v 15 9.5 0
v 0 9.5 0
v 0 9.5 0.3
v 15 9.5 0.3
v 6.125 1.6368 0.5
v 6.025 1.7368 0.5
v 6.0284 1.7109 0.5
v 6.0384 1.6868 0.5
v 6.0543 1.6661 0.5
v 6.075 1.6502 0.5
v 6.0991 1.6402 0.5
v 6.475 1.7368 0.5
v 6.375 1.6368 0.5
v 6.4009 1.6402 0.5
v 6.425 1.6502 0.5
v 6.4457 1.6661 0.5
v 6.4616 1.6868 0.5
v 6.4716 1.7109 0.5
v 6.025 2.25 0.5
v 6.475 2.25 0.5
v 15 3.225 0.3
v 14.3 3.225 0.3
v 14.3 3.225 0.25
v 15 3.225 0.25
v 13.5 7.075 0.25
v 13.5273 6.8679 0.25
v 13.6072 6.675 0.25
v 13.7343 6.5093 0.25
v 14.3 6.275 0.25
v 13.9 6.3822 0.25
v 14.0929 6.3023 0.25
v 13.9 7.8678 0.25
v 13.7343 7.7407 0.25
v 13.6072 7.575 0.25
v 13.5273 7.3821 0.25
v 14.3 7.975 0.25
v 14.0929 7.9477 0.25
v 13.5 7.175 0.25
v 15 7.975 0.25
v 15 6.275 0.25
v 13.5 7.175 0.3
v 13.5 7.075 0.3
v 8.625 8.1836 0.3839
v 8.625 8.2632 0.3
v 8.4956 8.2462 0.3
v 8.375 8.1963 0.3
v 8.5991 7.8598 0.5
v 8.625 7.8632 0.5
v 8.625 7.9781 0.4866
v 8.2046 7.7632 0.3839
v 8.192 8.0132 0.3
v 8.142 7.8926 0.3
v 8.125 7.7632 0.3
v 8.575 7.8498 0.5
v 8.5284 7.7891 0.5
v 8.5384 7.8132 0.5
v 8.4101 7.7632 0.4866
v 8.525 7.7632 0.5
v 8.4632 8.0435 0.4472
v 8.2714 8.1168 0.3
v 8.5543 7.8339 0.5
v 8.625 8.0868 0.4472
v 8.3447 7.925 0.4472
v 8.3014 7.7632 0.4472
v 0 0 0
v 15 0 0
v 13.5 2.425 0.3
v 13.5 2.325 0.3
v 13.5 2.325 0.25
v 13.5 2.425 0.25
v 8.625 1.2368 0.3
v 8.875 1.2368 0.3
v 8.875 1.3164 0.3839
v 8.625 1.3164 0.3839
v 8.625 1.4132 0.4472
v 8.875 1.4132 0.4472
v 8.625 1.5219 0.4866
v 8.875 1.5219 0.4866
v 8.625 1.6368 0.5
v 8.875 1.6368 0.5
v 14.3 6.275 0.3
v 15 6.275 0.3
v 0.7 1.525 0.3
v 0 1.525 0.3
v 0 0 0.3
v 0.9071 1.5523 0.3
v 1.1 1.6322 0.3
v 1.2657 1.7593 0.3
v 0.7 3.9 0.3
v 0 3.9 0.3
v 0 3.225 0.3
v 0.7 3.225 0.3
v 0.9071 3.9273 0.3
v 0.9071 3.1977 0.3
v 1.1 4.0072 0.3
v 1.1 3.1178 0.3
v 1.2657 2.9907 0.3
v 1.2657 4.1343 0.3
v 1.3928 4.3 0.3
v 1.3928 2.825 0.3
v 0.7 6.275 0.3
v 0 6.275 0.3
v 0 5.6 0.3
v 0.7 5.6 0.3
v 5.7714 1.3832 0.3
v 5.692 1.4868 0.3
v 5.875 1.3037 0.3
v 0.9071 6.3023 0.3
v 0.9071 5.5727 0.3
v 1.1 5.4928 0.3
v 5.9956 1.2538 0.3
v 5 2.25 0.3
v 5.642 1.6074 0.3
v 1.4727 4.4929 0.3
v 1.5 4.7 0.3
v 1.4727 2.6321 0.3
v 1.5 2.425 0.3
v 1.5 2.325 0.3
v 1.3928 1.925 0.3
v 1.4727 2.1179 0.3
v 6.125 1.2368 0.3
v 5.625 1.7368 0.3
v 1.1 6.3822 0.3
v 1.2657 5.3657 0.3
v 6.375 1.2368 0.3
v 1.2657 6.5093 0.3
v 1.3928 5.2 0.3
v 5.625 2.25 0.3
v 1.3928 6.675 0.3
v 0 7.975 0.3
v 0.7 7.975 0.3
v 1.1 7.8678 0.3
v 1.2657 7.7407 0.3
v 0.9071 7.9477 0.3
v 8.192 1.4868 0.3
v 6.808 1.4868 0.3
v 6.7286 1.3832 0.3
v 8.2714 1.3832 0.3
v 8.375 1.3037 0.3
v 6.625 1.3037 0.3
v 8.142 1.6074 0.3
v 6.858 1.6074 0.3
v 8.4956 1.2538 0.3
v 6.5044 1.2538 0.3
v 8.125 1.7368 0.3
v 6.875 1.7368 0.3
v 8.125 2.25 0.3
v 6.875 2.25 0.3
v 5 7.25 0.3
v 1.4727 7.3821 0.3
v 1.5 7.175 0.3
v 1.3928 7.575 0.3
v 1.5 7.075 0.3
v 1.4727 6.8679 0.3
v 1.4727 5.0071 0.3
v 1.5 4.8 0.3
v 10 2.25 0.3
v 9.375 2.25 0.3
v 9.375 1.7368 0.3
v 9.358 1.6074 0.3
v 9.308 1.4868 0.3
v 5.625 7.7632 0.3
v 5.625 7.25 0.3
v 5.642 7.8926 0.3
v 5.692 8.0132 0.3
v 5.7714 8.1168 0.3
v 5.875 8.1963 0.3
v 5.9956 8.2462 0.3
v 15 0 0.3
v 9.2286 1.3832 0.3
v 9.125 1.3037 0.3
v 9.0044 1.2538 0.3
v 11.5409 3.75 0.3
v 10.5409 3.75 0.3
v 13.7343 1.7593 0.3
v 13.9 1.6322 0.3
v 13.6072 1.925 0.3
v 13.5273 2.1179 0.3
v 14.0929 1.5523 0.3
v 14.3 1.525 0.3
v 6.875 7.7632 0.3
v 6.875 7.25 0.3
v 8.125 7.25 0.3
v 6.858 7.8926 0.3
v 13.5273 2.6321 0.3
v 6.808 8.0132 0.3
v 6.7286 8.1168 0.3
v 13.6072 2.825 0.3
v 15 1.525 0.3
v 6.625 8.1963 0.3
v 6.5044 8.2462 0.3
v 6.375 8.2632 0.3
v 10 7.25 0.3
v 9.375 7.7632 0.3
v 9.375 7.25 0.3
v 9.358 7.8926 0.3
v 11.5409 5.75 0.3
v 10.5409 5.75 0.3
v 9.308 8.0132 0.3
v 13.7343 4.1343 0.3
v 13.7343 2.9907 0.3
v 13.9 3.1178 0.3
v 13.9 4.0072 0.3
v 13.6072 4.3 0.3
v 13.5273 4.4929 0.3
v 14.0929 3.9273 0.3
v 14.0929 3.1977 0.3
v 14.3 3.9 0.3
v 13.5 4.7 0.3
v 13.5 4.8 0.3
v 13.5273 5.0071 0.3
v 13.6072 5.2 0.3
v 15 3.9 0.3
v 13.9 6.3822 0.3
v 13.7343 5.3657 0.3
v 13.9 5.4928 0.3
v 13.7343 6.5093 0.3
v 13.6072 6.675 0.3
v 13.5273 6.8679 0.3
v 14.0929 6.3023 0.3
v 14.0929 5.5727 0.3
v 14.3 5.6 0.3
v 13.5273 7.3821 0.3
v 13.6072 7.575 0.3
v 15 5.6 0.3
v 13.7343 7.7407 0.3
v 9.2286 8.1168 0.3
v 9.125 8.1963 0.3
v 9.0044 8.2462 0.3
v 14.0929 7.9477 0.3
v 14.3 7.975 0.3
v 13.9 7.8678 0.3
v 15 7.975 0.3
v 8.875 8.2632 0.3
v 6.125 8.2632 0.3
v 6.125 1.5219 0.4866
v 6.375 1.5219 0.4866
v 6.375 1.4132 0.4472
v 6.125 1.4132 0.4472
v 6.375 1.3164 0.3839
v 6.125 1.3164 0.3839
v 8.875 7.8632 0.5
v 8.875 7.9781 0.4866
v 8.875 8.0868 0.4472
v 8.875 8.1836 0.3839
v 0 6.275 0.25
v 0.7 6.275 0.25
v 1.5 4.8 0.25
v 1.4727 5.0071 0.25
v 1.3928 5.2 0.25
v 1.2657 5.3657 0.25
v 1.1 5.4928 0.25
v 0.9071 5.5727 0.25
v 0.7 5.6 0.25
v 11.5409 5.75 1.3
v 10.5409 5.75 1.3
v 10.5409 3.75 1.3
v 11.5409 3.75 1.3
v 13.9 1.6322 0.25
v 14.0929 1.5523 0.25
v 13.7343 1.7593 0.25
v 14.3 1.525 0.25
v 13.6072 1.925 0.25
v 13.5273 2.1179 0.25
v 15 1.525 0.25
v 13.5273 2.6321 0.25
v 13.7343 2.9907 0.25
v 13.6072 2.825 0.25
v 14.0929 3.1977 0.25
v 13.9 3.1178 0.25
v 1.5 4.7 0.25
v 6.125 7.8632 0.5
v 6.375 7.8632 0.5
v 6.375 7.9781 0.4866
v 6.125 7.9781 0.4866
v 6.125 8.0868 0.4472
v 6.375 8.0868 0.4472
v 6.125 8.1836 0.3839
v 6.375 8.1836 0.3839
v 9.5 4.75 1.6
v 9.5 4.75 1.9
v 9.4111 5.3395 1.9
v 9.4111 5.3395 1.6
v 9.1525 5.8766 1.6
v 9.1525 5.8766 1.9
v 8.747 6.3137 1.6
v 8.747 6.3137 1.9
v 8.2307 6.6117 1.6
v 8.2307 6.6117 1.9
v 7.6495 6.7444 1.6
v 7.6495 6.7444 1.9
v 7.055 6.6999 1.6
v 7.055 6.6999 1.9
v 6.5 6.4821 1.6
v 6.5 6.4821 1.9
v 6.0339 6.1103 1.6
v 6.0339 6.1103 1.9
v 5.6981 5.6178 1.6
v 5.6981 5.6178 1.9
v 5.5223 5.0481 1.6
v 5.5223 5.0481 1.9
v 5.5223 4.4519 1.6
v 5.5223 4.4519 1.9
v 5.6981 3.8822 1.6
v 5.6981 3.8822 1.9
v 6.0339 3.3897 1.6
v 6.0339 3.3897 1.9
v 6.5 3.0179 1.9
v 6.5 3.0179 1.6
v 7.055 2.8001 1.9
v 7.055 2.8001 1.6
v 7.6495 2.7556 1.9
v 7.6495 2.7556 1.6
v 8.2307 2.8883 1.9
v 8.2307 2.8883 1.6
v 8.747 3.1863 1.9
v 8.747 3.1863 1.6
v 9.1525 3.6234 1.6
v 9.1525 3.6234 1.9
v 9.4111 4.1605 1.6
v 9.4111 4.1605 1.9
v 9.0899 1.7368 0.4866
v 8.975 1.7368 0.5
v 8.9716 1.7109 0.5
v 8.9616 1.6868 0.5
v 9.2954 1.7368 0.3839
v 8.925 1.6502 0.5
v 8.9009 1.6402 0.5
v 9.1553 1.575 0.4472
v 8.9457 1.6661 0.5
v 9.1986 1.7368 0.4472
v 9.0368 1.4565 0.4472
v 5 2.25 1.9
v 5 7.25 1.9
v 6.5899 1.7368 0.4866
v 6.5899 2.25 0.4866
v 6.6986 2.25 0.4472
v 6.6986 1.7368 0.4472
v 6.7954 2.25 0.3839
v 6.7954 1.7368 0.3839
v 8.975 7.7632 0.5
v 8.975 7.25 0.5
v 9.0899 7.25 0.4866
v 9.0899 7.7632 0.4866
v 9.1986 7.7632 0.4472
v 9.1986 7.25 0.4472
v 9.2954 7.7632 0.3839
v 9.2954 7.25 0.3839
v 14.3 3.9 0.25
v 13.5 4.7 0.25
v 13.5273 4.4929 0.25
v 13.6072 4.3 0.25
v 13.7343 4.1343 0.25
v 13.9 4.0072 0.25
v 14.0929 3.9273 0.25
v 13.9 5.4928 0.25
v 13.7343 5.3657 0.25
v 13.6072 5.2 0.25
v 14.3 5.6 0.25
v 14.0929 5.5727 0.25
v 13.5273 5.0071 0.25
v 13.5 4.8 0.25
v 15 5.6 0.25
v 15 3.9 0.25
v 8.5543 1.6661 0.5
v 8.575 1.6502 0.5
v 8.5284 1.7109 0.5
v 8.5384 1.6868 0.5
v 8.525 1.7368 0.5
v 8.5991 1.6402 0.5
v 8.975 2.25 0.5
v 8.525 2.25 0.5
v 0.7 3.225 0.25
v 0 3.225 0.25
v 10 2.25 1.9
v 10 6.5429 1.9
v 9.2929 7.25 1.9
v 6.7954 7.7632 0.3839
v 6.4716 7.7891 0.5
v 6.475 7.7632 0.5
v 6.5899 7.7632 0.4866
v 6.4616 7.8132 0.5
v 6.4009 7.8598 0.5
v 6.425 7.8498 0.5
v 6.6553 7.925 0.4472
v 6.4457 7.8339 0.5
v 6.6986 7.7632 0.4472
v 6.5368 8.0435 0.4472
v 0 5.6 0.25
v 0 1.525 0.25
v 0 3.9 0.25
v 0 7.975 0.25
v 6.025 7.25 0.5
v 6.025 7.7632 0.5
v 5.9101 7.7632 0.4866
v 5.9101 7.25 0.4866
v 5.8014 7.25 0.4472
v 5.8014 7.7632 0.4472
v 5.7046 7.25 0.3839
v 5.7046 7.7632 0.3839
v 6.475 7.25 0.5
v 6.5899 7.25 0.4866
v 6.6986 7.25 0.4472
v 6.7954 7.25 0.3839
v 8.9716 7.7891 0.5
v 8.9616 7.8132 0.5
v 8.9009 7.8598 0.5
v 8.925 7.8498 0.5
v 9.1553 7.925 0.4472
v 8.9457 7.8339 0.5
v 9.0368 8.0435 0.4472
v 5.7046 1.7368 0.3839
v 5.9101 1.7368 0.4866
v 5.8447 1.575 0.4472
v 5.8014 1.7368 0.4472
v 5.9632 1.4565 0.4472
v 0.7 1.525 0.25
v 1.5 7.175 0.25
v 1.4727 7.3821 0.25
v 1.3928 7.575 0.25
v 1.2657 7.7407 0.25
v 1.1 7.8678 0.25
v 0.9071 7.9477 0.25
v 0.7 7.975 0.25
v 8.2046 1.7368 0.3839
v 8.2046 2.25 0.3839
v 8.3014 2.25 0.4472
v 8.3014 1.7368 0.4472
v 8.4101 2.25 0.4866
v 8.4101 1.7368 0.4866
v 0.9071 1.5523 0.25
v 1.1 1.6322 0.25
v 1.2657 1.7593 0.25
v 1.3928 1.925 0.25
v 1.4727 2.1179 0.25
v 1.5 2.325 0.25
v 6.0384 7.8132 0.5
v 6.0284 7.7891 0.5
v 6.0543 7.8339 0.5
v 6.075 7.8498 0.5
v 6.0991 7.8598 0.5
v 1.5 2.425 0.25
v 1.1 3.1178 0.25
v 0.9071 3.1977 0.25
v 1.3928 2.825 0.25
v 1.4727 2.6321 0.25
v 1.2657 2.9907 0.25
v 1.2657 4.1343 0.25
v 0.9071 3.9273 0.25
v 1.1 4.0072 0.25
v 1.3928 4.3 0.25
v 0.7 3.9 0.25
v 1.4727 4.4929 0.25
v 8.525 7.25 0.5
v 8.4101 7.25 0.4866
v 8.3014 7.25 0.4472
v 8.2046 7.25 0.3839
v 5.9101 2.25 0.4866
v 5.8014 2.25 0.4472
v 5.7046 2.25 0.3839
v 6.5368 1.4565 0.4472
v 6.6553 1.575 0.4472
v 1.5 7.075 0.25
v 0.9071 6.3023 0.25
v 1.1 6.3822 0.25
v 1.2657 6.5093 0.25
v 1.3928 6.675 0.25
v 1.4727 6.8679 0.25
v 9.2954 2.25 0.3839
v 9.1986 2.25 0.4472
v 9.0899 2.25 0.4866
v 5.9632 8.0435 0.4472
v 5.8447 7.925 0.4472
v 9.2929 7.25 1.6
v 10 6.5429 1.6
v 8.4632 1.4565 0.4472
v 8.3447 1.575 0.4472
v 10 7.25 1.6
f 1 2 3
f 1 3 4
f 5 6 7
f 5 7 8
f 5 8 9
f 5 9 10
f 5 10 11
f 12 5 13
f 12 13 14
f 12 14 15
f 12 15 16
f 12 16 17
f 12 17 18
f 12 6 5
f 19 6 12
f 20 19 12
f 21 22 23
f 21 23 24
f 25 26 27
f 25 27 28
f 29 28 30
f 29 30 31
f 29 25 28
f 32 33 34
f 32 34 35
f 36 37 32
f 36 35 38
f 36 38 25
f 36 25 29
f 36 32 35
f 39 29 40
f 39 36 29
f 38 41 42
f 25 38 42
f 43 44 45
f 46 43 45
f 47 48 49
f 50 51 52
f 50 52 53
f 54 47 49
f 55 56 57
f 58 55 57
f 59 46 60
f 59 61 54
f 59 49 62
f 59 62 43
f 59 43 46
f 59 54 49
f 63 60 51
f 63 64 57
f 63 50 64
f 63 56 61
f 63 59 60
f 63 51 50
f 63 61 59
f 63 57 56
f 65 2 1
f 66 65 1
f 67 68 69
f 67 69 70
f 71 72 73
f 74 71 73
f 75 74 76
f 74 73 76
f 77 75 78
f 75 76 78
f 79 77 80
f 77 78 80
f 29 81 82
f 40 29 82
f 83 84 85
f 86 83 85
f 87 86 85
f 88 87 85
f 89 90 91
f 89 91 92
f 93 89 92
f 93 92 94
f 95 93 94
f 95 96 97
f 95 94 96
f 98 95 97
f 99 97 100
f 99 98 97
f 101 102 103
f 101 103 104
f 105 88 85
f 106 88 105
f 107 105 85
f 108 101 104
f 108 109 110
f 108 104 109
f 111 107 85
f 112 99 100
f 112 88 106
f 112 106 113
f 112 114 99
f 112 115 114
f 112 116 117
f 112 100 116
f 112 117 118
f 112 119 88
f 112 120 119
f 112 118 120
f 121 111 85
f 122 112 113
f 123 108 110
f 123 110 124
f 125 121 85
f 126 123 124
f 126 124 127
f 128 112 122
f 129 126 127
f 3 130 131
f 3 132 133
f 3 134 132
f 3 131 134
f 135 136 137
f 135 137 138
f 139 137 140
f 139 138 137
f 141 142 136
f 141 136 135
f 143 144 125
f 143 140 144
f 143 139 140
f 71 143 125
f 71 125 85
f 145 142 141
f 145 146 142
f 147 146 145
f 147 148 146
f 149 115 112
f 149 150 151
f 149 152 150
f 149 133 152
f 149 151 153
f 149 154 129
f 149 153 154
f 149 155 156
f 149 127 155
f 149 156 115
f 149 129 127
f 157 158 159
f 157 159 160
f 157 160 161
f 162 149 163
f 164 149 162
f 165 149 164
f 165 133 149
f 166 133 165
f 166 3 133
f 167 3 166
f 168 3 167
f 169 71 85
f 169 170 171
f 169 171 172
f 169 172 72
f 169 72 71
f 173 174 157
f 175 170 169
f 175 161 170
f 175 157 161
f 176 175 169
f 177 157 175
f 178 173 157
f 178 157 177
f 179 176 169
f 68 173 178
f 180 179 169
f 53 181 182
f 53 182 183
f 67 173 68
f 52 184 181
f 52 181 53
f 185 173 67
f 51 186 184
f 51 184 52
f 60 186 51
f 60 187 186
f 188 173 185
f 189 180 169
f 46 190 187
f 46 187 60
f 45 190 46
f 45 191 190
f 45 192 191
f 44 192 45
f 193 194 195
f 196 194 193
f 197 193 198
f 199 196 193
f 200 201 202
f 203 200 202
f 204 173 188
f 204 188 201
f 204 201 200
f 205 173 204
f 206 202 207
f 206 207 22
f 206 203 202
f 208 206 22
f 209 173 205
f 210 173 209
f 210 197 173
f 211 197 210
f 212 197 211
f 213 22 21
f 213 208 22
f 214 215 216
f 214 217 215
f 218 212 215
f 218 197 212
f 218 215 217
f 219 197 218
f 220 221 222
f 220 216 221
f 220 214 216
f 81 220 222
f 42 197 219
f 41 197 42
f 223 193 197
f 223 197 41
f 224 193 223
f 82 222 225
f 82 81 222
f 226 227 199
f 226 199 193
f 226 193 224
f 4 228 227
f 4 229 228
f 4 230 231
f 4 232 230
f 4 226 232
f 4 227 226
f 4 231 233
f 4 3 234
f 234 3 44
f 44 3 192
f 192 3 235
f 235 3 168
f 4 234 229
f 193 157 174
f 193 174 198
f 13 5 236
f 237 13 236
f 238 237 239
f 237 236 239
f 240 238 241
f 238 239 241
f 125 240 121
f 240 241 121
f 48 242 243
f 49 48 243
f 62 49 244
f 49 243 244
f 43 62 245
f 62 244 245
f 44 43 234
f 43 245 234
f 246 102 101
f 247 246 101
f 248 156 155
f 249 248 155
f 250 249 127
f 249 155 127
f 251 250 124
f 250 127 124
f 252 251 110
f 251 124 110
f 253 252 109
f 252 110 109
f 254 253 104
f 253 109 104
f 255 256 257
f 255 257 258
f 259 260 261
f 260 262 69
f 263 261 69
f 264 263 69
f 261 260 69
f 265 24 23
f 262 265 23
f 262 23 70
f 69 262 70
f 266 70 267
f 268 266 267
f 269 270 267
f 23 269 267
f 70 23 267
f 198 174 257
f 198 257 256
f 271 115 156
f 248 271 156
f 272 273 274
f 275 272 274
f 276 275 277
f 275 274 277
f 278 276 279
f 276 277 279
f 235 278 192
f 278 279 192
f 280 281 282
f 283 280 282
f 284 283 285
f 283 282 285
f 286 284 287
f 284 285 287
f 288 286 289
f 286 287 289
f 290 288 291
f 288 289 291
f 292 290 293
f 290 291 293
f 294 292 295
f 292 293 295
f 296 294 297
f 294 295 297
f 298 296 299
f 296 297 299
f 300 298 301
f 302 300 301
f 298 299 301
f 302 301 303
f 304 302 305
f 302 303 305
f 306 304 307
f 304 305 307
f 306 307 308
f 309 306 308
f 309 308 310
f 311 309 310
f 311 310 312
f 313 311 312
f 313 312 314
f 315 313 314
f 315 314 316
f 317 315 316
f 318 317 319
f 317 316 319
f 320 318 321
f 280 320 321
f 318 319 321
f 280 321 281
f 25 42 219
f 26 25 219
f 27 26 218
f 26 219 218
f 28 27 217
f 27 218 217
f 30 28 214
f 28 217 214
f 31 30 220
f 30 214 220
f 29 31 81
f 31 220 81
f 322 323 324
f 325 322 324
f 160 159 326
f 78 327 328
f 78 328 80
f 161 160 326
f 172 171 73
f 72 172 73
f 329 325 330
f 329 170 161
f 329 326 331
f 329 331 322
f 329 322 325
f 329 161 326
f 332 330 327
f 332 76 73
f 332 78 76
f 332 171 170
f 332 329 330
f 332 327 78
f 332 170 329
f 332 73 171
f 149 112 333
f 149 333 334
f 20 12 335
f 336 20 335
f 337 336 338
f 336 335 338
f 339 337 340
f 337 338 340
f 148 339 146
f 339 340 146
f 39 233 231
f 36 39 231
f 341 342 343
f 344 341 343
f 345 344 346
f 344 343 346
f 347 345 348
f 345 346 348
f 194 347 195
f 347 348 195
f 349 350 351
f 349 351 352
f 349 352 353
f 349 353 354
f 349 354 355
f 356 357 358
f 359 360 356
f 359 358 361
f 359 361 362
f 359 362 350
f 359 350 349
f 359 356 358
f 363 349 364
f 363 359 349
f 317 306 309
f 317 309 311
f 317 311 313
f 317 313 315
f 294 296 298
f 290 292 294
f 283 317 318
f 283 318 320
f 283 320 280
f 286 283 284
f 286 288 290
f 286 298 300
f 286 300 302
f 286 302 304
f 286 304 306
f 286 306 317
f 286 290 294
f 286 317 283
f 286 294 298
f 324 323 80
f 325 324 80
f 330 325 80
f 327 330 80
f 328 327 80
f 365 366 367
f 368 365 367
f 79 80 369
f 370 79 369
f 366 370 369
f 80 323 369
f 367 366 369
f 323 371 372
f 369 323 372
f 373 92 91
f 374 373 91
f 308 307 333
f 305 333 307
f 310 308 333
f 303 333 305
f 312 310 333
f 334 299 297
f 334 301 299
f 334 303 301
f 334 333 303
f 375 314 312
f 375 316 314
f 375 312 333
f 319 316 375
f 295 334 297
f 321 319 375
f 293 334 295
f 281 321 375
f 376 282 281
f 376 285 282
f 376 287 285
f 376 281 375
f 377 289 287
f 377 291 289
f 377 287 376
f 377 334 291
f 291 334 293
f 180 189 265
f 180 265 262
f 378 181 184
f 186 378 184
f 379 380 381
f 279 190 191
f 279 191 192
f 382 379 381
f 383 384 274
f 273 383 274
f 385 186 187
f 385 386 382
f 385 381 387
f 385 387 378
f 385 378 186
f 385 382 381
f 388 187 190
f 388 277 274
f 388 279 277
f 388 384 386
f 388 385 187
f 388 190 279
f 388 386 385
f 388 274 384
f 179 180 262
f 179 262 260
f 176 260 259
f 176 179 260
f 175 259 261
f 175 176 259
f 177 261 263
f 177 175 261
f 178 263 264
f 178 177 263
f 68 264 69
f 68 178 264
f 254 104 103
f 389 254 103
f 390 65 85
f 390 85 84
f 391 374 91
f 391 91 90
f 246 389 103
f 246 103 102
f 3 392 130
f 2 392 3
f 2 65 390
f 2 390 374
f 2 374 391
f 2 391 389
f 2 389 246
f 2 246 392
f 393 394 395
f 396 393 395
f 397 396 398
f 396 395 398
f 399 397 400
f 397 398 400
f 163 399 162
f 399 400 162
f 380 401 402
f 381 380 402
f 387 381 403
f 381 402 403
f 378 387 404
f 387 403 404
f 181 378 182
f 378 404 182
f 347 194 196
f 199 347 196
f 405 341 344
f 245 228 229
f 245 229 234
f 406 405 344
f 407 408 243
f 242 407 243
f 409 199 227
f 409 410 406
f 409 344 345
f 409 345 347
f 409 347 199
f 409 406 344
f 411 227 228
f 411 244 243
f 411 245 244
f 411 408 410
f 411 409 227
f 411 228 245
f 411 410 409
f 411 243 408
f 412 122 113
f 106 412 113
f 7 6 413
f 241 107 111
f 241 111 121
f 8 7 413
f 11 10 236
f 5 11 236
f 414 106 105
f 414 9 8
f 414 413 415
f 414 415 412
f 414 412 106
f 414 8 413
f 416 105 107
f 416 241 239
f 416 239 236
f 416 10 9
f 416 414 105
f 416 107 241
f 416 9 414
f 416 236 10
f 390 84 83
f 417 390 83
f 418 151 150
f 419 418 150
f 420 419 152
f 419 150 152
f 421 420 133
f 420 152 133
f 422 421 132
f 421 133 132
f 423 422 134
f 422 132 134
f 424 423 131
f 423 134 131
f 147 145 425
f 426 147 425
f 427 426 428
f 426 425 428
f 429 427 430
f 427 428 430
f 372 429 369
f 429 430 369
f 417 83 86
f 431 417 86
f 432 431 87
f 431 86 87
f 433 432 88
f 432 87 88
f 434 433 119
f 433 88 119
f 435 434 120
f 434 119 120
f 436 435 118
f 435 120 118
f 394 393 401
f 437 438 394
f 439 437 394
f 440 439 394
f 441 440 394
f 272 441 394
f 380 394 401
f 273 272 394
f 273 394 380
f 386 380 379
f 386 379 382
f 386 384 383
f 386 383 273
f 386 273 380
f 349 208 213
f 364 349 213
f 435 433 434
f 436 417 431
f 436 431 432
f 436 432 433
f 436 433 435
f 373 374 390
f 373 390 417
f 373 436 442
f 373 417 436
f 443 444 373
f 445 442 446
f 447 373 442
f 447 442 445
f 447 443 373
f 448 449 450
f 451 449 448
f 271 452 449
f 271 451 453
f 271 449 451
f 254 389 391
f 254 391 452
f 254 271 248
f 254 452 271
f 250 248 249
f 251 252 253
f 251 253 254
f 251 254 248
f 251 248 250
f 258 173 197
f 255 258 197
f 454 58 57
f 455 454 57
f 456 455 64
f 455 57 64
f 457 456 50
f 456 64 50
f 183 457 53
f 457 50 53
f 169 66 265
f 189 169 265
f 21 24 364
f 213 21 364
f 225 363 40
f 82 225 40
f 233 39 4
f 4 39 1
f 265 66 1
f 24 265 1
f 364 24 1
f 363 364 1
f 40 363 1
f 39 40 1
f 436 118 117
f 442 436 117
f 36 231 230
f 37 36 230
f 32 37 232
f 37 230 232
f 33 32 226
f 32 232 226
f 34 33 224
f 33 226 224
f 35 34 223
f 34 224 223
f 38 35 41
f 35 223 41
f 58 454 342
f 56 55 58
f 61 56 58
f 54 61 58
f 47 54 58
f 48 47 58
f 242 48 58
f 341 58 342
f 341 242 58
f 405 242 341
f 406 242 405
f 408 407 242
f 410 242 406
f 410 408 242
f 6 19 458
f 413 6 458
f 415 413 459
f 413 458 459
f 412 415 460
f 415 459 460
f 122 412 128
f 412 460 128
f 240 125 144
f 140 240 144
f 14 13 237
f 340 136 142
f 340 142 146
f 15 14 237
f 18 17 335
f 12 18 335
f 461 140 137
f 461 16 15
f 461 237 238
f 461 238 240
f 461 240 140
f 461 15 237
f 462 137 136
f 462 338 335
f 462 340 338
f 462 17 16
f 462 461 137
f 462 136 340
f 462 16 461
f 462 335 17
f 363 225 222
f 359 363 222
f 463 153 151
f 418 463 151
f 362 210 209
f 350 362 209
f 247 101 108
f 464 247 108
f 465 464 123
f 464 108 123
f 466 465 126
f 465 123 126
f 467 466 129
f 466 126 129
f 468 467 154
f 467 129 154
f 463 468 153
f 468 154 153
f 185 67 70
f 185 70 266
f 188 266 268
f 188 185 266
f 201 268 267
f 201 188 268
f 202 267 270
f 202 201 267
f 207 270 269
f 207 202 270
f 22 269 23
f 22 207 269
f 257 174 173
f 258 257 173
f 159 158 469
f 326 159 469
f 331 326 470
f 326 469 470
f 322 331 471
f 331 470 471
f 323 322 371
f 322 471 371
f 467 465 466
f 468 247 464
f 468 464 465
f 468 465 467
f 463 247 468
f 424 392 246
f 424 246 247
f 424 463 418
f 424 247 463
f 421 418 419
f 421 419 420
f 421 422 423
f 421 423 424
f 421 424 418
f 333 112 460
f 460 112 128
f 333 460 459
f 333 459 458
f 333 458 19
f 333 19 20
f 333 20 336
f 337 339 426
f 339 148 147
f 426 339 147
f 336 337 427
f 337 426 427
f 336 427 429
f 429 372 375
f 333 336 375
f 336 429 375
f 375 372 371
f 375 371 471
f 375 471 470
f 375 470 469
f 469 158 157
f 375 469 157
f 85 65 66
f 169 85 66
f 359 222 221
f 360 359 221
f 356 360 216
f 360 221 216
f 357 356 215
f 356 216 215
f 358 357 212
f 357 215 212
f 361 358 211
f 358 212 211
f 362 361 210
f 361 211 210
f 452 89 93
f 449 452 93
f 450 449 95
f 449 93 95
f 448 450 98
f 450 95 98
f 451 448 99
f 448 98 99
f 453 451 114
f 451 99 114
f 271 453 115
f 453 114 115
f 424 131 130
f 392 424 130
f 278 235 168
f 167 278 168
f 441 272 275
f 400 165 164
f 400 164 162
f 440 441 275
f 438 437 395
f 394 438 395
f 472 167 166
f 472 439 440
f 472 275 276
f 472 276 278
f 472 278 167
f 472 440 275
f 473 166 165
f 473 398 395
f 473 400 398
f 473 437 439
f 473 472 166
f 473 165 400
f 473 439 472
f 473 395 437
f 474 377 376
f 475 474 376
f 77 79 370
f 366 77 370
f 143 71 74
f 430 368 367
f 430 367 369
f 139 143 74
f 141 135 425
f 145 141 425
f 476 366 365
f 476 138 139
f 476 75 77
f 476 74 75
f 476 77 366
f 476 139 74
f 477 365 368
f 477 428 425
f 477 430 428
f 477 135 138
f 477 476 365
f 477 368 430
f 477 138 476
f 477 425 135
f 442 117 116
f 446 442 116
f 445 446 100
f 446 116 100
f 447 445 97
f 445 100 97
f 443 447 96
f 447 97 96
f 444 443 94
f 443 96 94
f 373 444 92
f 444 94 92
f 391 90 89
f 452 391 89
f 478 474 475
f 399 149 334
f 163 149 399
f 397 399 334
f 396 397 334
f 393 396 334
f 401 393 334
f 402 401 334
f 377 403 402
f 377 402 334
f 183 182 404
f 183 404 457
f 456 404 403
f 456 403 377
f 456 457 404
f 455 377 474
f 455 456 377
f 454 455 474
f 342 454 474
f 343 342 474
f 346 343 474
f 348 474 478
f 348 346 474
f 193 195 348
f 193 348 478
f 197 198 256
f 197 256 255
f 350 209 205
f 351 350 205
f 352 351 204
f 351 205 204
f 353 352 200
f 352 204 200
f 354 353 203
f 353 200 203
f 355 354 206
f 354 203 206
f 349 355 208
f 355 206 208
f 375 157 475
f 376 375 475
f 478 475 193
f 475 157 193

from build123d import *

# Parameters (mm, degrees)
ESQUISSE1_W             = 15
ESQUISSE1_H             = 9.5
BOSS_EXTRU_1_DEPTH      = 0.3
ESQUISSE2_W             = 5
ESQUISSE2_H             = 5
BOSS_EXTRU_2_DEPTH      = 1.6
ESQUISSE3_R             = 2
ENL_V_MAT_EXTRU_1_DEPTH = 0.3
BOSS_EXTRU_3_DEPTH      = 0.2
CONG_1_R                = 0.5
ENL_V_MAT_EXTRU_2_DEPTH = 0.05
ESQUISSE6_W             = 1
ESQUISSE6_H             = 2
BOSS_EXTRU_4_DEPTH      = 1


with BuildPart() as part:
    # Esquisse1 → Boss.-Extru.1 (new body)
    with BuildSketch(Plane.XY):
        with Locations((7.5, 4.75)):
            Rectangle(ESQUISSE1_W, ESQUISSE1_H)
    extrude(amount=BOSS_EXTRU_1_DEPTH)

    # Esquisse2 → Boss.-Extru.2 (add)
    with BuildSketch(Plane.XY.offset(0.3)):
        with Locations((7.5, 4.75)):
            Rectangle(ESQUISSE2_W, ESQUISSE2_H)
    extrude(amount=BOSS_EXTRU_2_DEPTH)

    # Esquisse3 → Enlèv. mat.-Extru.1 (cut)
    with BuildSketch(Plane.XY.offset(1.9)):
        with Locations((7.5, 4.75)):
            Circle(ESQUISSE3_R)
        Polygon((9.292893219, 7.25), (10, 6.542893219), (10, 7.25), align=None)
    extrude(amount=-ENL_V_MAT_EXTRU_1_DEPTH, mode=Mode.SUBTRACT)

    # Esquisse4 → Boss.-Extru.3 (add)
    with BuildSketch(Plane.XY.offset(0.3)):
        with BuildLine():
            Line((8.875, 8.263238259), (8.625, 8.263238259))
            ThreePointArc((8.625, 8.263238259), (8.271446609, 8.11679165), (8.125, 7.763238259))
            Line((8.125, 7.763238259), (8.125, 7.25))
            Line((8.125, 7.25), (9.375, 7.25))
            Line((9.375, 7.25), (9.375, 7.763238259))
            ThreePointArc((9.375, 7.763238259), (9.228553391, 8.11679165), (8.875, 8.263238259))
        make_face()
        with BuildLine():
            Line((5.625, 7.25), (6.875, 7.25))
            Line((6.875, 7.25), (6.875, 7.763238259))
            ThreePointArc((6.875, 7.763238259), (6.728553391, 8.11679165), (6.375, 8.263238259))
            Line((6.375, 8.263238259), (6.125, 8.263238259))
            ThreePointArc((6.125, 8.263238259), (5.771446609, 8.11679165), (5.625, 7.763238259))
            Line((5.625, 7.763238259), (5.625, 7.25))
        make_face()
        with BuildLine():
            Line((9.375, 2.25), (9.375, 1.736761741))
            ThreePointArc((9.375, 1.736761741), (9.228553391, 1.38320835), (8.875, 1.236761741))
            Line((8.875, 1.236761741), (8.625, 1.236761741))
            ThreePointArc((8.625, 1.236761741), (8.271446609, 1.38320835), (8.125, 1.736761741))
            Line((8.125, 1.736761741), (8.125, 2.25))
            Line((8.125, 2.25), (9.375, 2.25))
        make_face()
        with BuildLine():
            Line((6.125, 1.236761741), (6.375, 1.236761741))
            ThreePointArc((6.375, 1.236761741), (6.728553391, 1.38320835), (6.875, 1.736761741))
            Line((6.875, 1.736761741), (6.875, 2.25))
            Line((6.875, 2.25), (5.625, 2.25))
            Line((5.625, 2.25), (5.625, 1.736761741))
            ThreePointArc((5.625, 1.736761741), (5.771446609, 1.38320835), (6.125, 1.236761741))
        make_face()
    extrude(amount=BOSS_EXTRU_3_DEPTH)

    # Congé1
    # the kernel refuses this fillet: 0.5 mm, written as the material it takes off along each edge
    with BuildSketch(Plane(origin=(8.125, 1.736761741, 0.5), x_dir=(2.6165736243852198e-11, 0, -1.0), z_dir=(0, 1, 0)), Plane(origin=(9.375, 2.25, 0.5), x_dir=(-2.6165736243852198e-11, 0, -1.0), z_dir=(0, -1, 0))) as cong_1_piece_1:
        with BuildLine():
            CenterArc((0.5, -0.4), CONG_1_R, 126.869897647, 53.130102355)
            Line((0, -0.4), (-0.01, -0.4))
            Line((-0.01, -0.4), (-0.01, 0))
            Line((-0.01, 0), (0, 0.01))
            ThreePointArc((0, 0.01), (0.1, 0.01), (0.194, 0.008))
            Line((0.194, 0.008), (0.2, 0))
        make_face()
    extrude(amount=0.513238259, mode=Mode.SUBTRACT)
    with BuildSketch(Plane(origin=(8.625, 1.736761741, 0.5), x_dir=(0, -1, 0), z_dir=(1, 0, 0))) as cong_1_piece_2:
        with BuildLine():
            CenterArc((0.1, 0.5), CONG_1_R, 270, 53.130102355)
            Line((0.1, 0), (0.1, -0.01))
            Line((0.1, -0.01), (0.5, -0.01))
            Line((0.5, -0.01), (0.51, 0))
            ThreePointArc((0.51, 0), (0.51, 0.1), (0.508, 0.194))
            Line((0.508, 0.194), (0.5, 0.2))
        make_face()
    revolve(axis=Axis((8.625, 1.736761741, 0.5), (0, 0, -1)), revolution_arc=90, mode=Mode.SUBTRACT)
    with BuildSketch(Plane(origin=(8.875, 1.236761741, 0.5), x_dir=(0, 2.6109114869598534e-11, -1.0), z_dir=(-1, 0, 0))) as cong_1_piece_3:
        with BuildLine():
            CenterArc((0.5, -0.4), CONG_1_R, 126.869897647, 53.130102355)
            Line((0, -0.4), (-0.01, -0.4))
            Line((-0.01, -0.4), (-0.01, 0))
            Line((-0.01, 0), (0, 0.01))
            ThreePointArc((0, 0.01), (0.1, 0.01), (0.194, 0.008))
            Line((0.194, 0.008), (0.2, 0))
        make_face()
    extrude(amount=0.25, mode=Mode.SUBTRACT)
    with BuildSketch(Plane(origin=(5.625, 2.25, 0.5), x_dir=(2.6059154833492393e-11, 0, -1.0), z_dir=(0, -1, 0)), Plane(origin=(6.875, 1.736761741, 0.5), x_dir=(-2.6112445538672294e-11, 0, -1.0), z_dir=(0, 1, 0)), Plane(origin=(6.875, 7.25, 0.5), x_dir=(-2.6112445538672294e-11, 0, -1.0), z_dir=(0, 1, 0)), Plane(origin=(5.625, 7.763238259, 0.5), x_dir=(2.6059154833492393e-11, 0, -1.0), z_dir=(0, -1, 0)), Plane(origin=(9.375, 7.25, 0.5), x_dir=(-2.6165736243852198e-11, 0, -1.0), z_dir=(0, 1, 0)), Plane(origin=(8.125, 7.763238259, 0.5), x_dir=(2.6165736243852198e-11, 0, -1.0), z_dir=(0, -1, 0))) as cong_1_piece_4:
        with BuildLine():
            CenterArc((0.5, 0.4), CONG_1_R, 179.999999999, 53.130102355)
            Line((0, 0.4), (-0.01, 0.4))
            Line((-0.01, 0.4), (-0.01, 0))
            Line((-0.01, 0), (0, -0.01))
            ThreePointArc((0, -0.01), (0.1, -0.01), (0.194, -0.008))
            Line((0.194, -0.008), (0.2, 0))
        make_face()
    extrude(amount=0.513238259, mode=Mode.SUBTRACT)
    with BuildSketch(Plane(origin=(6.125, 1.736761741, 0.5), x_dir=(-1, 0, 0), z_dir=(0, 1, 0))) as cong_1_piece_5:
        with BuildLine():
            CenterArc((0.1, -0.5), CONG_1_R, 36.869897645, 53.130102355)
            Line((0.1, 0), (0.1, 0.01))
            Line((0.1, 0.01), (0.5, 0.01))
            Line((0.5, 0.01), (0.51, 0))
            ThreePointArc((0.51, 0), (0.51, -0.1), (0.508, -0.194))
            Line((0.508, -0.194), (0.5, -0.2))
        make_face()
    revolve(axis=Axis((6.125, 1.736761741, 0.5), (0, 0, 1)), revolution_arc=90, mode=Mode.SUBTRACT)
    with BuildSketch(Plane(origin=(6.125, 1.236761741, 0.5), x_dir=(0, 2.6109114869598534e-11, -1.0), z_dir=(1, 0, 0)), Plane(origin=(6.375, 8.263238259, 0.5), x_dir=(0, -2.6112445538672342e-11, -1.0), z_dir=(-1, 0, 0)), Plane(origin=(8.875, 8.263238259, 0.5), x_dir=(0, -2.6112445538672342e-11, -1.0), z_dir=(-1, 0, 0))) as cong_1_piece_6:
        with BuildLine():
            CenterArc((0.5, 0.4), CONG_1_R, 179.999999999, 53.130102355)
            Line((0, 0.4), (-0.01, 0.4))
            Line((-0.01, 0.4), (-0.01, 0))
            Line((-0.01, 0), (0, -0.01))
            ThreePointArc((0, -0.01), (0.1, -0.01), (0.194, -0.008))
            Line((0.194, -0.008), (0.2, 0))
        make_face()
    extrude(amount=0.25, mode=Mode.SUBTRACT)
    with BuildSketch(Plane(origin=(6.125, 7.763238259, 0.5), x_dir=(0, 1, 0), z_dir=(1, 0, 0))) as cong_1_piece_7:
        with BuildLine():
            CenterArc((0.1, -0.5), CONG_1_R, 36.869897645, 53.130102355)
            Line((0.1, 0), (0.1, 0.01))
            Line((0.1, 0.01), (0.5, 0.01))
            Line((0.5, 0.01), (0.51, 0))
            ThreePointArc((0.51, 0), (0.51, -0.1), (0.508, -0.194))
            Line((0.508, -0.194), (0.5, -0.2))
        make_face()
    revolve(axis=Axis((6.125, 7.763238259, 0.5), (0, 0, 1)), revolution_arc=90, mode=Mode.SUBTRACT)
    with BuildSketch(Plane(origin=(8.875, 7.763238259, 0.5), x_dir=(1, 0, 0), z_dir=(0, -1, 0))) as cong_1_piece_8:
        with BuildLine():
            CenterArc((0.1, -0.5), CONG_1_R, 36.869897645, 53.130102355)
            Line((0.1, 0), (0.1, 0.01))
            Line((0.1, 0.01), (0.5, 0.01))
            Line((0.5, 0.01), (0.51, 0))
            ThreePointArc((0.51, 0), (0.51, -0.1), (0.508, -0.194))
            Line((0.508, -0.194), (0.5, -0.2))
        make_face()
    revolve(axis=Axis((8.875, 7.763238259, 0.5), (0, 0, 1)), revolution_arc=90, mode=Mode.SUBTRACT)
    with BuildSketch(Plane(origin=(8.875, 1.736761741, 0.5), x_dir=(1, 0, 0), z_dir=(0, 1, 0))) as cong_1_piece_9:
        with BuildLine():
            CenterArc((0.1, 0.5), CONG_1_R, 270, 53.130102355)
            Line((0.1, 0), (0.1, -0.01))
            Line((0.1, -0.01), (0.5, -0.01))
            Line((0.5, -0.01), (0.51, 0))
            ThreePointArc((0.51, 0), (0.51, 0.1), (0.508, 0.194))
            Line((0.508, 0.194), (0.5, 0.2))
        make_face()
    revolve(axis=Axis((8.875, 1.736761741, 0.5), (0, 0, -1)), revolution_arc=90, mode=Mode.SUBTRACT)
    with BuildSketch(Plane(origin=(6.375, 1.736761741, 0.5), x_dir=(0, -1, 0), z_dir=(-1, 0, 0))) as cong_1_piece_10:
        with BuildLine():
            CenterArc((0.1, -0.5), CONG_1_R, 36.869897645, 53.130102355)
            Line((0.1, 0), (0.1, 0.01))
            Line((0.1, 0.01), (0.5, 0.01))
            Line((0.5, 0.01), (0.51, 0))
            ThreePointArc((0.51, 0), (0.51, -0.1), (0.508, -0.194))
            Line((0.508, -0.194), (0.5, -0.2))
        make_face()
    revolve(axis=Axis((6.375, 1.736761741, 0.5), (0, 0, 1)), revolution_arc=90, mode=Mode.SUBTRACT)
    with BuildSketch(Plane(origin=(6.375, 7.763238259, 0.5), x_dir=(1, 0, 0), z_dir=(0, -1, 0))) as cong_1_piece_11:
        with BuildLine():
            CenterArc((0.1, -0.5), CONG_1_R, 36.869897645, 53.130102355)
            Line((0.1, 0), (0.1, 0.01))
            Line((0.1, 0.01), (0.5, 0.01))
            Line((0.5, 0.01), (0.51, 0))
            ThreePointArc((0.51, 0), (0.51, -0.1), (0.508, -0.194))
            Line((0.508, -0.194), (0.5, -0.2))
        make_face()
    revolve(axis=Axis((6.375, 7.763238259, 0.5), (0, 0, 1)), revolution_arc=90, mode=Mode.SUBTRACT)
    with BuildSketch(Plane(origin=(8.625, 7.763238259, 0.5), x_dir=(0, 1, 0), z_dir=(1, 0, 0))) as cong_1_piece_12:
        with BuildLine():
            CenterArc((0.1, -0.5), CONG_1_R, 36.869897645, 53.130102355)
            Line((0.1, 0), (0.1, 0.01))
            Line((0.1, 0.01), (0.5, 0.01))
            Line((0.5, 0.01), (0.51, 0))
            ThreePointArc((0.51, 0), (0.51, -0.1), (0.508, -0.194))
            Line((0.508, -0.194), (0.5, -0.2))
        make_face()
    revolve(axis=Axis((8.625, 7.763238259, 0.5), (0, 0, 1)), revolution_arc=90, mode=Mode.SUBTRACT)

    # Esquisse5 → Enlèv. mat.-Extru.2 (cut)
    with BuildSketch(Plane.XY.offset(0.3)):
        with BuildLine():
            Line((-1.5, 1.525), (0.7, 1.525))
            ThreePointArc((0.7, 1.525), (1.265685425, 1.759314575), (1.5, 2.325))
            Line((1.5, 2.325), (1.5, 2.425))
            ThreePointArc((1.5, 2.425), (1.265685425, 2.990685425), (0.7, 3.225))
            Line((0.7, 3.225), (-1.5, 3.225))
            Line((-1.5, 3.225), (-1.5, 1.525))
        make_face()
        with BuildLine():
            Line((-1.5, 3.9), (0.7, 3.9))
            ThreePointArc((0.7, 3.9), (1.265685425, 4.134314575), (1.5, 4.7))
            Line((1.5, 4.7), (1.5, 4.8))
            ThreePointArc((1.5, 4.8), (1.265685425, 5.365685425), (0.7, 5.6))
            Line((0.7, 5.6), (-1.5, 5.6))
            Line((-1.5, 5.6), (-1.5, 3.9))
        make_face()
        with BuildLine():
            Line((-1.5, 6.275), (0.7, 6.275))
            ThreePointArc((0.7, 6.275), (1.265685425, 6.509314575), (1.5, 7.075))
            Line((1.5, 7.075), (1.5, 7.175))
            ThreePointArc((1.5, 7.175), (1.265685425, 7.740685425), (0.7, 7.975))
            Line((0.7, 7.975), (-1.5, 7.975))
            Line((-1.5, 7.975), (-1.5, 6.275))
        make_face()
        with BuildLine():
            Line((16.5, 3.225), (16.5, 1.525))
            Line((16.5, 1.525), (14.3, 1.525))
            ThreePointArc((14.3, 1.525), (13.734314575, 1.759314575), (13.5, 2.325))
            Line((13.5, 2.325), (13.5, 2.425))
            ThreePointArc((13.5, 2.425), (13.734314575, 2.990685425), (14.3, 3.225))
            Line((14.3, 3.225), (16.5, 3.225))
        make_face()
        with BuildLine():
            Line((16.5, 5.6), (14.3, 5.6))
            ThreePointArc((14.3, 5.6), (13.734314575, 5.365685425), (13.5, 4.8))
            Line((13.5, 4.8), (13.5, 4.7))
            ThreePointArc((13.5, 4.7), (13.734314575, 4.134314575), (14.3, 3.9))
            Line((14.3, 3.9), (16.5, 3.9))
            Line((16.5, 3.9), (16.5, 5.6))
        make_face()
        with BuildLine():
            Line((16.5, 7.975), (14.3, 7.975))
            ThreePointArc((14.3, 7.975), (13.734314575, 7.740685425), (13.5, 7.175))
            Line((13.5, 7.175), (13.5, 7.075))
            ThreePointArc((13.5, 7.075), (13.734314575, 6.509314575), (14.3, 6.275))
            Line((14.3, 6.275), (16.5, 6.275))
            Line((16.5, 6.275), (16.5, 7.975))
        make_face()
    extrude(amount=-ENL_V_MAT_EXTRU_2_DEPTH, mode=Mode.SUBTRACT)

    # Esquisse6 → Boss.-Extru.4 (add)
    with BuildSketch(Plane.XY.offset(0.3)):
        with Locations((11.04087009, 4.75)):
            Rectangle(ESQUISSE6_W, ESQUISSE6_H)
    extrude(amount=BOSS_EXTRU_4_DEPTH)


solid = part.part
